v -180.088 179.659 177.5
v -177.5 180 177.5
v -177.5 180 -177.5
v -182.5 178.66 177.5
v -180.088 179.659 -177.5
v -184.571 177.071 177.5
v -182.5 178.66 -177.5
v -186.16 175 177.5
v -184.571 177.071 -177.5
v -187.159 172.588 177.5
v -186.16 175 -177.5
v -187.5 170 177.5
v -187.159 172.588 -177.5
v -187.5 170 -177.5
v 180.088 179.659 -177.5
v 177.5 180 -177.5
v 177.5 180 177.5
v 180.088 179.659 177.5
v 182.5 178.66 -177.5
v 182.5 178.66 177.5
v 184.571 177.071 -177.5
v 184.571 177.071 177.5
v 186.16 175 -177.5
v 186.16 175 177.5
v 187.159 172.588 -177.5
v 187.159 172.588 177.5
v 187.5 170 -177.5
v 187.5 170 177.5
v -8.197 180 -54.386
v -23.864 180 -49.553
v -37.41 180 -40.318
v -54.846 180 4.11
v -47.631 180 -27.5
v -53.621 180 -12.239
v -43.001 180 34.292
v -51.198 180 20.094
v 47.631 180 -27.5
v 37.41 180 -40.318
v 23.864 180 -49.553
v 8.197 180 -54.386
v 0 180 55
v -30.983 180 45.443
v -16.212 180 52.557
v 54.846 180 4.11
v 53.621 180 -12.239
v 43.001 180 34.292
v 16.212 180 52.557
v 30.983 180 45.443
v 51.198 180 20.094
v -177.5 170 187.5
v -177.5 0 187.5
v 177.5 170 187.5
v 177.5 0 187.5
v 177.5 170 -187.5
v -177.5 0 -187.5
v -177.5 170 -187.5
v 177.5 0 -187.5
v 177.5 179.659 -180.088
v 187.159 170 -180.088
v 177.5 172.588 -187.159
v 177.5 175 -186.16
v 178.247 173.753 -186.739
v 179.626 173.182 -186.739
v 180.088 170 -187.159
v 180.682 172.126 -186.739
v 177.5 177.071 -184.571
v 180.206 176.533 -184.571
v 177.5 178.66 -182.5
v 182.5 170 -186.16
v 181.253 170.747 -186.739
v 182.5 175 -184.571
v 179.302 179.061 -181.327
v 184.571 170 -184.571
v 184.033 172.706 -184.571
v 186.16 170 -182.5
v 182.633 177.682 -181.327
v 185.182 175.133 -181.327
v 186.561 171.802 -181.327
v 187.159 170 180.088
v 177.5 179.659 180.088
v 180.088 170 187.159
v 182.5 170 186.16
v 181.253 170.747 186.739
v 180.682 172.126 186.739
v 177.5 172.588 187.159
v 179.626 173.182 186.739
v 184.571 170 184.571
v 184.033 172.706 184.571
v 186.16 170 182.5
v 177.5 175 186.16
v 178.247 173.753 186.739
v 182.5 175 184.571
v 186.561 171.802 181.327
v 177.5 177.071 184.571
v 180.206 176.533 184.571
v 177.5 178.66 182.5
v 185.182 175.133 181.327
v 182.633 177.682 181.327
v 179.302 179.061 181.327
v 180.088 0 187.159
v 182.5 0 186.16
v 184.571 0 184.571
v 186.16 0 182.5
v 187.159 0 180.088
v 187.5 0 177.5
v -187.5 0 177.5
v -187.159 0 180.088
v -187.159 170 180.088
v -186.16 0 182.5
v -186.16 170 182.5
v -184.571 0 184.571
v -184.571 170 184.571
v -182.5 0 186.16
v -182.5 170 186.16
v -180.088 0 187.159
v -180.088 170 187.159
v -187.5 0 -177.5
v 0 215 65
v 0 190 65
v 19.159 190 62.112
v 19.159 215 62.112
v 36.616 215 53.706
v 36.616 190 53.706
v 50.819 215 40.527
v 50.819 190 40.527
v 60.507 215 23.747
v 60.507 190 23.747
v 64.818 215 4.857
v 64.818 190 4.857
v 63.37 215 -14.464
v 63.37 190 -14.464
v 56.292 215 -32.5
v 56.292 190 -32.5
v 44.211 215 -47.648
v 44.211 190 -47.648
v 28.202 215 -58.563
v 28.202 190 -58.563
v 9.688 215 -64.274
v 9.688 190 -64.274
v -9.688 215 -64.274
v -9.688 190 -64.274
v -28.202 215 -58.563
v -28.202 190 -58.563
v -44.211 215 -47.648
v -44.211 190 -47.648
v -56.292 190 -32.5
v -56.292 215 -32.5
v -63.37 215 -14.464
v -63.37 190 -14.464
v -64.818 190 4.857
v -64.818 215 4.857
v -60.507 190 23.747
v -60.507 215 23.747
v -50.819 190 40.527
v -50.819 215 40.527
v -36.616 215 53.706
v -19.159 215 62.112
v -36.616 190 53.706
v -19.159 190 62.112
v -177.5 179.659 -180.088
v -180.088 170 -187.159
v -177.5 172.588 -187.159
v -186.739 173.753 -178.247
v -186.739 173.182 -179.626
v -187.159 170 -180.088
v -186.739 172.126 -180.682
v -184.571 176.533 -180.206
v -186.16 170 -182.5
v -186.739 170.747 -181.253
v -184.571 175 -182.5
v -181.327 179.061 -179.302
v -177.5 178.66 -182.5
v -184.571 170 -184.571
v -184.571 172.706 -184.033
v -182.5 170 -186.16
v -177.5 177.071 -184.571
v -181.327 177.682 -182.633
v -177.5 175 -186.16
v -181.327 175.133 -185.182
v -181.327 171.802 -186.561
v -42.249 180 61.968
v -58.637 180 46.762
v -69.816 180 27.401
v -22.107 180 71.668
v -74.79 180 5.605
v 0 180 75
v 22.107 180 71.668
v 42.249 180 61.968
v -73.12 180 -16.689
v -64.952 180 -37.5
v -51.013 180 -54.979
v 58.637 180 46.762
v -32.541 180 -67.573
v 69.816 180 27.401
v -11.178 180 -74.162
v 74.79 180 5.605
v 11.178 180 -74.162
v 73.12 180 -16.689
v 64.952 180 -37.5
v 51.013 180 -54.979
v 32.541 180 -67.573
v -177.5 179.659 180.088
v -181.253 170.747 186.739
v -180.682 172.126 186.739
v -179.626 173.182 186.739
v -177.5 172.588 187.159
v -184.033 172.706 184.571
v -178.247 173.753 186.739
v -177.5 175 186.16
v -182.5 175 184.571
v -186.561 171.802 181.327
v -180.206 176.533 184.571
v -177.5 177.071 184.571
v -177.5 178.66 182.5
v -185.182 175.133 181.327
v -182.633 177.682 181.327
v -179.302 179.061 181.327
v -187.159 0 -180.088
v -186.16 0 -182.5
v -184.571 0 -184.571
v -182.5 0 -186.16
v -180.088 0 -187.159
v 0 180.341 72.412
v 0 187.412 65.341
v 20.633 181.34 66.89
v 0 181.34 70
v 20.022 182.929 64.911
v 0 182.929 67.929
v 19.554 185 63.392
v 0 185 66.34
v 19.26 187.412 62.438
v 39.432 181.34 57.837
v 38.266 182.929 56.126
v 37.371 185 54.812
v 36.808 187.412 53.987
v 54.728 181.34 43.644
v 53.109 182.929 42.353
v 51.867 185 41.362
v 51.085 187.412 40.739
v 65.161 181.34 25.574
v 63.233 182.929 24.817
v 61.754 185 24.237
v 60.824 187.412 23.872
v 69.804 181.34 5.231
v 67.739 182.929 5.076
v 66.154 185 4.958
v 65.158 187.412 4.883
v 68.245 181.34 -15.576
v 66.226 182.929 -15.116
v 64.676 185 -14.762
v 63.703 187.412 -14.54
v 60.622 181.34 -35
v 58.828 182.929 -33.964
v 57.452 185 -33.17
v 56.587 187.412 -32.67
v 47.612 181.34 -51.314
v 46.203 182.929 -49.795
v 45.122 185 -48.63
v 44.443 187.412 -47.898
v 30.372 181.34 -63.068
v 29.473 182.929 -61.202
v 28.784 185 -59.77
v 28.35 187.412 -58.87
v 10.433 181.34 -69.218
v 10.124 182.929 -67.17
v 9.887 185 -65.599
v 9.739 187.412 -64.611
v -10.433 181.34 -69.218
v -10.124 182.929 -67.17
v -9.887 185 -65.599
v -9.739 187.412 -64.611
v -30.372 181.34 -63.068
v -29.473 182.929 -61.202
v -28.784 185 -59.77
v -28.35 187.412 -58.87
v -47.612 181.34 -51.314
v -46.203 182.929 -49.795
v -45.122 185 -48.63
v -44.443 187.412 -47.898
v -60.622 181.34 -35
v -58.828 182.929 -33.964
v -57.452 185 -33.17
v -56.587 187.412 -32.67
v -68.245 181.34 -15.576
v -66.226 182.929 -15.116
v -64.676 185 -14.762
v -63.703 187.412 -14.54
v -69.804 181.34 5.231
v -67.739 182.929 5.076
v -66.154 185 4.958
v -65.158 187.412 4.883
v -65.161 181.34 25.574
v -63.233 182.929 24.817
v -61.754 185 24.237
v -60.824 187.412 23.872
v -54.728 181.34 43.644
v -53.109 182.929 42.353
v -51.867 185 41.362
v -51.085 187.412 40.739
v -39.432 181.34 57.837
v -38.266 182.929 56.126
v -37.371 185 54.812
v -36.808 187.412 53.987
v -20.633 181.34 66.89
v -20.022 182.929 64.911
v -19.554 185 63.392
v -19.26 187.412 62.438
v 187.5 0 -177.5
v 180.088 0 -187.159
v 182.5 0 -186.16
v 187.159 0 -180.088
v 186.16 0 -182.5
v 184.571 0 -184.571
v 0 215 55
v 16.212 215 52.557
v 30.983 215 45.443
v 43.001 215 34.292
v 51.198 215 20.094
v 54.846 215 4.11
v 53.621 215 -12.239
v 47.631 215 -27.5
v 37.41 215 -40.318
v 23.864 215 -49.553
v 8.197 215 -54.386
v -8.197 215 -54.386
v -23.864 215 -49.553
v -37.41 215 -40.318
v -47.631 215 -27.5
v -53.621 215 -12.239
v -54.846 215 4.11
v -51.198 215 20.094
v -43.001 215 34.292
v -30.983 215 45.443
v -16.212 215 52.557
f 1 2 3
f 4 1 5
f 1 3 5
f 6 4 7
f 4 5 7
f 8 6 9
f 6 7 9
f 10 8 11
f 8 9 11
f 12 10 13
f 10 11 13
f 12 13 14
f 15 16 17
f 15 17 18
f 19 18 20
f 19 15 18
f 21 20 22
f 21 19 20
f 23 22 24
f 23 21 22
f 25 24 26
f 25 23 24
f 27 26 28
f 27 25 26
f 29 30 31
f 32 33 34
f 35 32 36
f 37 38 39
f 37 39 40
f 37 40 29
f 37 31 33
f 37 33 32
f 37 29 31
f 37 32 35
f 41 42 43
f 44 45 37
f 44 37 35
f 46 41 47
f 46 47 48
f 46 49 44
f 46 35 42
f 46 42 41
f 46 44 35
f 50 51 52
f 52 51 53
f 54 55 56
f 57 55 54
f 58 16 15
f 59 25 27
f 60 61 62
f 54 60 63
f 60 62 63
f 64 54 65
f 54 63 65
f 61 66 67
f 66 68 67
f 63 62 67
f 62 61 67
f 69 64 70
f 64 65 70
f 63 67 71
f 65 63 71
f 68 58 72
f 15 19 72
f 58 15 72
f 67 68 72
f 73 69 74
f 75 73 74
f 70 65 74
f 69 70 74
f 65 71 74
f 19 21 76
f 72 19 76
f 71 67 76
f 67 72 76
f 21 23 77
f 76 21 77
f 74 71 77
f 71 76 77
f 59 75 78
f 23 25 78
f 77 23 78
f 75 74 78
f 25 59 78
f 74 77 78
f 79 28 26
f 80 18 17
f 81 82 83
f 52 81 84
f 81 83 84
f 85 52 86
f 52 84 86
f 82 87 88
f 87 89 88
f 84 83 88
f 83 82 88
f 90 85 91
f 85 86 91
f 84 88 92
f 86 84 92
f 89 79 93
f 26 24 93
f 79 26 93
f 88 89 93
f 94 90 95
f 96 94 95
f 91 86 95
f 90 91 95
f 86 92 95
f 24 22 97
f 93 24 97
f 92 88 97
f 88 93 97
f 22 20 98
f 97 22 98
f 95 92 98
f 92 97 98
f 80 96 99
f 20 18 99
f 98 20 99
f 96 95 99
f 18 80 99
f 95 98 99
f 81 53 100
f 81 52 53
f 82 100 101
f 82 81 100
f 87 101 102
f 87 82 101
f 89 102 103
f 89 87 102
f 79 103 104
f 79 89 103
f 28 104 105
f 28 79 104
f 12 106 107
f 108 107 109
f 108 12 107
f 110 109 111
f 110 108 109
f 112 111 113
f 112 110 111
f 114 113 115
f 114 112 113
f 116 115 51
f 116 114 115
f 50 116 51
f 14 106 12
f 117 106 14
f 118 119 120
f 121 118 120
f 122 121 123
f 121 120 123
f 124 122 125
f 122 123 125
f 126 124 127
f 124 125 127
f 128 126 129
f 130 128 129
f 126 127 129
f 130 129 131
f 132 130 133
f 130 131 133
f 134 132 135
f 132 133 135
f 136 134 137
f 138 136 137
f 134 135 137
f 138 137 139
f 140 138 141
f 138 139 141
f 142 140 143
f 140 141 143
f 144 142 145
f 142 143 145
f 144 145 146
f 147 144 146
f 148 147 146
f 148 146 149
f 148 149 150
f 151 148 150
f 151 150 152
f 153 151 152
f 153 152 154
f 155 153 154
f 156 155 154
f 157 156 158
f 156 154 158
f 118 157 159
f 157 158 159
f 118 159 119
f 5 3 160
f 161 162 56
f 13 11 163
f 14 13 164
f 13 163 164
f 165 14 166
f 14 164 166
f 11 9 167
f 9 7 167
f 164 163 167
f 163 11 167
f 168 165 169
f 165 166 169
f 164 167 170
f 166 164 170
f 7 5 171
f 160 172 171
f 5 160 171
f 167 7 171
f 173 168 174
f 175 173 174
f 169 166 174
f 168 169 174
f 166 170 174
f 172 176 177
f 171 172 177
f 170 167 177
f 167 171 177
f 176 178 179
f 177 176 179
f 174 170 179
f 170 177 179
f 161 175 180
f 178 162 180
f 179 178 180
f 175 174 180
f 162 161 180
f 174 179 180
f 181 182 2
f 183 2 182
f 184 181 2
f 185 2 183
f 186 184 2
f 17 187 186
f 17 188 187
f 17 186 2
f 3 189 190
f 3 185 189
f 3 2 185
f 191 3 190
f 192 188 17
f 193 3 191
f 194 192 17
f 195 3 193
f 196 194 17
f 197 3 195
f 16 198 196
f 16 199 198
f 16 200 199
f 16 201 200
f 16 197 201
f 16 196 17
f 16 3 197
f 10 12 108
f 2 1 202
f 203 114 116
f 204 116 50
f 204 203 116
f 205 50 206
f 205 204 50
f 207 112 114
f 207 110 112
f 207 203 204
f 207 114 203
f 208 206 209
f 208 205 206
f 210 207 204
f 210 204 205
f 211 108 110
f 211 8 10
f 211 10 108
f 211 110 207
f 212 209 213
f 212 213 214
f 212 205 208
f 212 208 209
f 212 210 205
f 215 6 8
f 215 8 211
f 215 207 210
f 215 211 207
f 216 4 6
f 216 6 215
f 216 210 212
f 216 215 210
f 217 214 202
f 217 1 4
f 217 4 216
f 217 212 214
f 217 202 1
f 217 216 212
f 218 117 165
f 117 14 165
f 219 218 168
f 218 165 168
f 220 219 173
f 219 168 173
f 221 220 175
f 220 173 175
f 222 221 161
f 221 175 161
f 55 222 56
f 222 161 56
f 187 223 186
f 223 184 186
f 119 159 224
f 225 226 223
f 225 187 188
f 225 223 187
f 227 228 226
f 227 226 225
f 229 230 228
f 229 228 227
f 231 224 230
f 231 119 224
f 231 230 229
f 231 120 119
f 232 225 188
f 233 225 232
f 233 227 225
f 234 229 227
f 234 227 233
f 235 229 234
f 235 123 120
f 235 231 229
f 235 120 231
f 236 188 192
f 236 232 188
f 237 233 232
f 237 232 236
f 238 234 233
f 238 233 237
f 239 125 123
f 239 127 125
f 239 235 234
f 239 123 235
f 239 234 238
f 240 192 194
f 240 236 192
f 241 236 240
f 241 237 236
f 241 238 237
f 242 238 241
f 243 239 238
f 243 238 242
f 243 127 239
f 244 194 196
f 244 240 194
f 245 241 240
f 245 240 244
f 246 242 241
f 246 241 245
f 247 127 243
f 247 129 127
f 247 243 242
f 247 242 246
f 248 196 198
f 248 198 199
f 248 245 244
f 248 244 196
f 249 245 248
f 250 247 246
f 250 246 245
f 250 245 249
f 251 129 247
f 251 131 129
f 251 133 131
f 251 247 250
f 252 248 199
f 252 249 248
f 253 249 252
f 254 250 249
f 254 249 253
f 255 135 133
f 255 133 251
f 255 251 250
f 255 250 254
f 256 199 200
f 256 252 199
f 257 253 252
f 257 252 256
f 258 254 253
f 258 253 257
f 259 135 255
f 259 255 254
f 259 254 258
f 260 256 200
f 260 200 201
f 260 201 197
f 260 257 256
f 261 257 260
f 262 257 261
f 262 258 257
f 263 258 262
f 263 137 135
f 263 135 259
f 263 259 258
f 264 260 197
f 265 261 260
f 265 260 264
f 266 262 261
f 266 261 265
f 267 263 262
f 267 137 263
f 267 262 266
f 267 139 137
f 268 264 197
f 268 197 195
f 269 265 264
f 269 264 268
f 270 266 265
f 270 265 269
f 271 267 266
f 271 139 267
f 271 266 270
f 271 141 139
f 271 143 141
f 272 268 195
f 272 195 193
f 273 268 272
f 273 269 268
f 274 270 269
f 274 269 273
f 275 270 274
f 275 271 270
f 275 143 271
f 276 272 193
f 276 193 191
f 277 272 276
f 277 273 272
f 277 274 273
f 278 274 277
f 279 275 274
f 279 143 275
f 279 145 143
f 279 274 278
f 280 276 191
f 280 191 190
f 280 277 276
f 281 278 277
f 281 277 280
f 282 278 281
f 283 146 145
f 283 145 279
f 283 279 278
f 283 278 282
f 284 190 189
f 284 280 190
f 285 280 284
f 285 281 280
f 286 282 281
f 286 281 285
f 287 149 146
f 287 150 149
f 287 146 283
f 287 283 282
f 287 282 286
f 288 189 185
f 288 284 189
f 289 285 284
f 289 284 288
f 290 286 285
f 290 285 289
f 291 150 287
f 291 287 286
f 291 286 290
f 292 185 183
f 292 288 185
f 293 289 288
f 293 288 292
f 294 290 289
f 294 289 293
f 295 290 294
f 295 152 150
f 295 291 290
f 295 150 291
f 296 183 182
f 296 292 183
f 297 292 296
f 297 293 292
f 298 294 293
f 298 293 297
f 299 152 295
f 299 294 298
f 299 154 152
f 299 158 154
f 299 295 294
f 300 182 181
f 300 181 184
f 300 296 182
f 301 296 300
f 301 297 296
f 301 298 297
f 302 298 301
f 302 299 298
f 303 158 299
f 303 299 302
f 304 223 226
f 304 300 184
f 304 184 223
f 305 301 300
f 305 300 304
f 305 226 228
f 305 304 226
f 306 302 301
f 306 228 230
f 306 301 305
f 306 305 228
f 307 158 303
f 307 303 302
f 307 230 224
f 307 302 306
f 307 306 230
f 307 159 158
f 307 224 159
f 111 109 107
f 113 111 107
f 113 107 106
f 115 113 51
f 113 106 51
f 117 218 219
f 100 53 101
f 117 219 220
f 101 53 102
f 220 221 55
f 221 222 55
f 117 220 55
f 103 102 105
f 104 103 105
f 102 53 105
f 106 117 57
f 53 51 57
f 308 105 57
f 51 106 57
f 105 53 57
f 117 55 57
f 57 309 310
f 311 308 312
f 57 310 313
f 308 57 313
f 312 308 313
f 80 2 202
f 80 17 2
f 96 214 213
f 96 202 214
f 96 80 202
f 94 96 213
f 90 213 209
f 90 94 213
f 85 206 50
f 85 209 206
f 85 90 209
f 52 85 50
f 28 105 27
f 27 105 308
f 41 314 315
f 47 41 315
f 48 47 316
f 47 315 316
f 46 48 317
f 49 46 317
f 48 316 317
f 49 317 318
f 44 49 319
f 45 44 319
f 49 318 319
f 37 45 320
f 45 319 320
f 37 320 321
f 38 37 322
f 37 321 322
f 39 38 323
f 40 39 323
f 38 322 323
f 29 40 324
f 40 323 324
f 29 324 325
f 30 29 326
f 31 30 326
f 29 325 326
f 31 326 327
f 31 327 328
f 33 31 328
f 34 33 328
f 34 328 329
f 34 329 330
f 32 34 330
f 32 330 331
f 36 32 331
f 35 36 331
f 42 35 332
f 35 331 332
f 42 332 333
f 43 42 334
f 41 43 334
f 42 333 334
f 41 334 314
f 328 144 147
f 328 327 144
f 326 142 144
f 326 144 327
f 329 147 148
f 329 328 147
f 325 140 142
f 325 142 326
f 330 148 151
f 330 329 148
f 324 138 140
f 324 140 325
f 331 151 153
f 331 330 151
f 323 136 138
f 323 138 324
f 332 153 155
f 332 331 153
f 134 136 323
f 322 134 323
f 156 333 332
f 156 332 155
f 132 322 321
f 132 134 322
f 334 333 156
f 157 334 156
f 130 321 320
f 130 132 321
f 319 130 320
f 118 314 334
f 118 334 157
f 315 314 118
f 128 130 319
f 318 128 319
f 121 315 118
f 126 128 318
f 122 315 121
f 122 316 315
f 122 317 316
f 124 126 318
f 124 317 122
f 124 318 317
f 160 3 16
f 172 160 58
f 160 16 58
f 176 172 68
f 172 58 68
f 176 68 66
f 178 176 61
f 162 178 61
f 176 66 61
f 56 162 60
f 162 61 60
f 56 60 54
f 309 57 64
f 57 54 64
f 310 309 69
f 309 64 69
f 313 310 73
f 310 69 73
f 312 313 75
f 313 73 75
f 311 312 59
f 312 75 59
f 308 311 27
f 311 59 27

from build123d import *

# Parameters (mm, degrees)
SKETCH1_W           = 375
SKETCH1_H           = 375
BOSS_EXTRUDE1_DEPTH = 180
SKETCH2_R           = 65
BOSS_EXTRUDE2_DEPTH = 35
SKETCH3_R           = 55
CUT_EXTRUDE1_DEPTH  = 35
FILLET1_R           = 10
FILLET2_R           = 10


with BuildPart() as part:
    # Sketch1 → Boss-Extrude1 (new body)
    with BuildSketch(Plane(origin=(0, 0, 0), x_dir=(1, 0, 0), z_dir=(0, 1, 0))):
        Rectangle(SKETCH1_W, SKETCH1_H)
    extrude(amount=BOSS_EXTRUDE1_DEPTH)

    # Sketch2 → Boss-Extrude2 (add)
    with BuildSketch(Plane(origin=(0, 180, 0), x_dir=(1, 0, 0), z_dir=(0, 1, 0))):
        with Locations(Location((0, 0, 0), (0, 0, 270))):
            Circle(SKETCH2_R)
    extrude(amount=BOSS_EXTRUDE2_DEPTH)

    # Sketch3 → Cut-Extrude1 (cut)
    with BuildSketch(Plane(origin=(0, 215, 0), x_dir=(1, 0, 0), z_dir=(0, 1, 0))):
        with Locations(Location((0, 0, 0), (0, 0, 270))):
            Circle(SKETCH3_R)
    extrude(amount=-CUT_EXTRUDE1_DEPTH, mode=Mode.SUBTRACT)

    # Fillet1
    fillet1_edges = [part.edges().sort_by_distance(p)[0] for p in [
        (0, 180, -65),
    ]]
    fillet(fillet1_edges, radius=FILLET1_R)

    # Fillet2
    fillet2_edges = [part.edges().sort_by_distance(p)[0] for p in [
        (187.5, 180, 0),
        (0, 180, -187.5),
        (-187.5, 180, 0),
        (-187.5, 90, -187.5),
        (187.5, 90, -187.5),
        (187.5, 90, 187.5),
        (-187.5, 90, 187.5),
        (0, 180, 187.5),
    ]]
    fillet(fillet2_edges, radius=FILLET2_R)


solid = part.part
